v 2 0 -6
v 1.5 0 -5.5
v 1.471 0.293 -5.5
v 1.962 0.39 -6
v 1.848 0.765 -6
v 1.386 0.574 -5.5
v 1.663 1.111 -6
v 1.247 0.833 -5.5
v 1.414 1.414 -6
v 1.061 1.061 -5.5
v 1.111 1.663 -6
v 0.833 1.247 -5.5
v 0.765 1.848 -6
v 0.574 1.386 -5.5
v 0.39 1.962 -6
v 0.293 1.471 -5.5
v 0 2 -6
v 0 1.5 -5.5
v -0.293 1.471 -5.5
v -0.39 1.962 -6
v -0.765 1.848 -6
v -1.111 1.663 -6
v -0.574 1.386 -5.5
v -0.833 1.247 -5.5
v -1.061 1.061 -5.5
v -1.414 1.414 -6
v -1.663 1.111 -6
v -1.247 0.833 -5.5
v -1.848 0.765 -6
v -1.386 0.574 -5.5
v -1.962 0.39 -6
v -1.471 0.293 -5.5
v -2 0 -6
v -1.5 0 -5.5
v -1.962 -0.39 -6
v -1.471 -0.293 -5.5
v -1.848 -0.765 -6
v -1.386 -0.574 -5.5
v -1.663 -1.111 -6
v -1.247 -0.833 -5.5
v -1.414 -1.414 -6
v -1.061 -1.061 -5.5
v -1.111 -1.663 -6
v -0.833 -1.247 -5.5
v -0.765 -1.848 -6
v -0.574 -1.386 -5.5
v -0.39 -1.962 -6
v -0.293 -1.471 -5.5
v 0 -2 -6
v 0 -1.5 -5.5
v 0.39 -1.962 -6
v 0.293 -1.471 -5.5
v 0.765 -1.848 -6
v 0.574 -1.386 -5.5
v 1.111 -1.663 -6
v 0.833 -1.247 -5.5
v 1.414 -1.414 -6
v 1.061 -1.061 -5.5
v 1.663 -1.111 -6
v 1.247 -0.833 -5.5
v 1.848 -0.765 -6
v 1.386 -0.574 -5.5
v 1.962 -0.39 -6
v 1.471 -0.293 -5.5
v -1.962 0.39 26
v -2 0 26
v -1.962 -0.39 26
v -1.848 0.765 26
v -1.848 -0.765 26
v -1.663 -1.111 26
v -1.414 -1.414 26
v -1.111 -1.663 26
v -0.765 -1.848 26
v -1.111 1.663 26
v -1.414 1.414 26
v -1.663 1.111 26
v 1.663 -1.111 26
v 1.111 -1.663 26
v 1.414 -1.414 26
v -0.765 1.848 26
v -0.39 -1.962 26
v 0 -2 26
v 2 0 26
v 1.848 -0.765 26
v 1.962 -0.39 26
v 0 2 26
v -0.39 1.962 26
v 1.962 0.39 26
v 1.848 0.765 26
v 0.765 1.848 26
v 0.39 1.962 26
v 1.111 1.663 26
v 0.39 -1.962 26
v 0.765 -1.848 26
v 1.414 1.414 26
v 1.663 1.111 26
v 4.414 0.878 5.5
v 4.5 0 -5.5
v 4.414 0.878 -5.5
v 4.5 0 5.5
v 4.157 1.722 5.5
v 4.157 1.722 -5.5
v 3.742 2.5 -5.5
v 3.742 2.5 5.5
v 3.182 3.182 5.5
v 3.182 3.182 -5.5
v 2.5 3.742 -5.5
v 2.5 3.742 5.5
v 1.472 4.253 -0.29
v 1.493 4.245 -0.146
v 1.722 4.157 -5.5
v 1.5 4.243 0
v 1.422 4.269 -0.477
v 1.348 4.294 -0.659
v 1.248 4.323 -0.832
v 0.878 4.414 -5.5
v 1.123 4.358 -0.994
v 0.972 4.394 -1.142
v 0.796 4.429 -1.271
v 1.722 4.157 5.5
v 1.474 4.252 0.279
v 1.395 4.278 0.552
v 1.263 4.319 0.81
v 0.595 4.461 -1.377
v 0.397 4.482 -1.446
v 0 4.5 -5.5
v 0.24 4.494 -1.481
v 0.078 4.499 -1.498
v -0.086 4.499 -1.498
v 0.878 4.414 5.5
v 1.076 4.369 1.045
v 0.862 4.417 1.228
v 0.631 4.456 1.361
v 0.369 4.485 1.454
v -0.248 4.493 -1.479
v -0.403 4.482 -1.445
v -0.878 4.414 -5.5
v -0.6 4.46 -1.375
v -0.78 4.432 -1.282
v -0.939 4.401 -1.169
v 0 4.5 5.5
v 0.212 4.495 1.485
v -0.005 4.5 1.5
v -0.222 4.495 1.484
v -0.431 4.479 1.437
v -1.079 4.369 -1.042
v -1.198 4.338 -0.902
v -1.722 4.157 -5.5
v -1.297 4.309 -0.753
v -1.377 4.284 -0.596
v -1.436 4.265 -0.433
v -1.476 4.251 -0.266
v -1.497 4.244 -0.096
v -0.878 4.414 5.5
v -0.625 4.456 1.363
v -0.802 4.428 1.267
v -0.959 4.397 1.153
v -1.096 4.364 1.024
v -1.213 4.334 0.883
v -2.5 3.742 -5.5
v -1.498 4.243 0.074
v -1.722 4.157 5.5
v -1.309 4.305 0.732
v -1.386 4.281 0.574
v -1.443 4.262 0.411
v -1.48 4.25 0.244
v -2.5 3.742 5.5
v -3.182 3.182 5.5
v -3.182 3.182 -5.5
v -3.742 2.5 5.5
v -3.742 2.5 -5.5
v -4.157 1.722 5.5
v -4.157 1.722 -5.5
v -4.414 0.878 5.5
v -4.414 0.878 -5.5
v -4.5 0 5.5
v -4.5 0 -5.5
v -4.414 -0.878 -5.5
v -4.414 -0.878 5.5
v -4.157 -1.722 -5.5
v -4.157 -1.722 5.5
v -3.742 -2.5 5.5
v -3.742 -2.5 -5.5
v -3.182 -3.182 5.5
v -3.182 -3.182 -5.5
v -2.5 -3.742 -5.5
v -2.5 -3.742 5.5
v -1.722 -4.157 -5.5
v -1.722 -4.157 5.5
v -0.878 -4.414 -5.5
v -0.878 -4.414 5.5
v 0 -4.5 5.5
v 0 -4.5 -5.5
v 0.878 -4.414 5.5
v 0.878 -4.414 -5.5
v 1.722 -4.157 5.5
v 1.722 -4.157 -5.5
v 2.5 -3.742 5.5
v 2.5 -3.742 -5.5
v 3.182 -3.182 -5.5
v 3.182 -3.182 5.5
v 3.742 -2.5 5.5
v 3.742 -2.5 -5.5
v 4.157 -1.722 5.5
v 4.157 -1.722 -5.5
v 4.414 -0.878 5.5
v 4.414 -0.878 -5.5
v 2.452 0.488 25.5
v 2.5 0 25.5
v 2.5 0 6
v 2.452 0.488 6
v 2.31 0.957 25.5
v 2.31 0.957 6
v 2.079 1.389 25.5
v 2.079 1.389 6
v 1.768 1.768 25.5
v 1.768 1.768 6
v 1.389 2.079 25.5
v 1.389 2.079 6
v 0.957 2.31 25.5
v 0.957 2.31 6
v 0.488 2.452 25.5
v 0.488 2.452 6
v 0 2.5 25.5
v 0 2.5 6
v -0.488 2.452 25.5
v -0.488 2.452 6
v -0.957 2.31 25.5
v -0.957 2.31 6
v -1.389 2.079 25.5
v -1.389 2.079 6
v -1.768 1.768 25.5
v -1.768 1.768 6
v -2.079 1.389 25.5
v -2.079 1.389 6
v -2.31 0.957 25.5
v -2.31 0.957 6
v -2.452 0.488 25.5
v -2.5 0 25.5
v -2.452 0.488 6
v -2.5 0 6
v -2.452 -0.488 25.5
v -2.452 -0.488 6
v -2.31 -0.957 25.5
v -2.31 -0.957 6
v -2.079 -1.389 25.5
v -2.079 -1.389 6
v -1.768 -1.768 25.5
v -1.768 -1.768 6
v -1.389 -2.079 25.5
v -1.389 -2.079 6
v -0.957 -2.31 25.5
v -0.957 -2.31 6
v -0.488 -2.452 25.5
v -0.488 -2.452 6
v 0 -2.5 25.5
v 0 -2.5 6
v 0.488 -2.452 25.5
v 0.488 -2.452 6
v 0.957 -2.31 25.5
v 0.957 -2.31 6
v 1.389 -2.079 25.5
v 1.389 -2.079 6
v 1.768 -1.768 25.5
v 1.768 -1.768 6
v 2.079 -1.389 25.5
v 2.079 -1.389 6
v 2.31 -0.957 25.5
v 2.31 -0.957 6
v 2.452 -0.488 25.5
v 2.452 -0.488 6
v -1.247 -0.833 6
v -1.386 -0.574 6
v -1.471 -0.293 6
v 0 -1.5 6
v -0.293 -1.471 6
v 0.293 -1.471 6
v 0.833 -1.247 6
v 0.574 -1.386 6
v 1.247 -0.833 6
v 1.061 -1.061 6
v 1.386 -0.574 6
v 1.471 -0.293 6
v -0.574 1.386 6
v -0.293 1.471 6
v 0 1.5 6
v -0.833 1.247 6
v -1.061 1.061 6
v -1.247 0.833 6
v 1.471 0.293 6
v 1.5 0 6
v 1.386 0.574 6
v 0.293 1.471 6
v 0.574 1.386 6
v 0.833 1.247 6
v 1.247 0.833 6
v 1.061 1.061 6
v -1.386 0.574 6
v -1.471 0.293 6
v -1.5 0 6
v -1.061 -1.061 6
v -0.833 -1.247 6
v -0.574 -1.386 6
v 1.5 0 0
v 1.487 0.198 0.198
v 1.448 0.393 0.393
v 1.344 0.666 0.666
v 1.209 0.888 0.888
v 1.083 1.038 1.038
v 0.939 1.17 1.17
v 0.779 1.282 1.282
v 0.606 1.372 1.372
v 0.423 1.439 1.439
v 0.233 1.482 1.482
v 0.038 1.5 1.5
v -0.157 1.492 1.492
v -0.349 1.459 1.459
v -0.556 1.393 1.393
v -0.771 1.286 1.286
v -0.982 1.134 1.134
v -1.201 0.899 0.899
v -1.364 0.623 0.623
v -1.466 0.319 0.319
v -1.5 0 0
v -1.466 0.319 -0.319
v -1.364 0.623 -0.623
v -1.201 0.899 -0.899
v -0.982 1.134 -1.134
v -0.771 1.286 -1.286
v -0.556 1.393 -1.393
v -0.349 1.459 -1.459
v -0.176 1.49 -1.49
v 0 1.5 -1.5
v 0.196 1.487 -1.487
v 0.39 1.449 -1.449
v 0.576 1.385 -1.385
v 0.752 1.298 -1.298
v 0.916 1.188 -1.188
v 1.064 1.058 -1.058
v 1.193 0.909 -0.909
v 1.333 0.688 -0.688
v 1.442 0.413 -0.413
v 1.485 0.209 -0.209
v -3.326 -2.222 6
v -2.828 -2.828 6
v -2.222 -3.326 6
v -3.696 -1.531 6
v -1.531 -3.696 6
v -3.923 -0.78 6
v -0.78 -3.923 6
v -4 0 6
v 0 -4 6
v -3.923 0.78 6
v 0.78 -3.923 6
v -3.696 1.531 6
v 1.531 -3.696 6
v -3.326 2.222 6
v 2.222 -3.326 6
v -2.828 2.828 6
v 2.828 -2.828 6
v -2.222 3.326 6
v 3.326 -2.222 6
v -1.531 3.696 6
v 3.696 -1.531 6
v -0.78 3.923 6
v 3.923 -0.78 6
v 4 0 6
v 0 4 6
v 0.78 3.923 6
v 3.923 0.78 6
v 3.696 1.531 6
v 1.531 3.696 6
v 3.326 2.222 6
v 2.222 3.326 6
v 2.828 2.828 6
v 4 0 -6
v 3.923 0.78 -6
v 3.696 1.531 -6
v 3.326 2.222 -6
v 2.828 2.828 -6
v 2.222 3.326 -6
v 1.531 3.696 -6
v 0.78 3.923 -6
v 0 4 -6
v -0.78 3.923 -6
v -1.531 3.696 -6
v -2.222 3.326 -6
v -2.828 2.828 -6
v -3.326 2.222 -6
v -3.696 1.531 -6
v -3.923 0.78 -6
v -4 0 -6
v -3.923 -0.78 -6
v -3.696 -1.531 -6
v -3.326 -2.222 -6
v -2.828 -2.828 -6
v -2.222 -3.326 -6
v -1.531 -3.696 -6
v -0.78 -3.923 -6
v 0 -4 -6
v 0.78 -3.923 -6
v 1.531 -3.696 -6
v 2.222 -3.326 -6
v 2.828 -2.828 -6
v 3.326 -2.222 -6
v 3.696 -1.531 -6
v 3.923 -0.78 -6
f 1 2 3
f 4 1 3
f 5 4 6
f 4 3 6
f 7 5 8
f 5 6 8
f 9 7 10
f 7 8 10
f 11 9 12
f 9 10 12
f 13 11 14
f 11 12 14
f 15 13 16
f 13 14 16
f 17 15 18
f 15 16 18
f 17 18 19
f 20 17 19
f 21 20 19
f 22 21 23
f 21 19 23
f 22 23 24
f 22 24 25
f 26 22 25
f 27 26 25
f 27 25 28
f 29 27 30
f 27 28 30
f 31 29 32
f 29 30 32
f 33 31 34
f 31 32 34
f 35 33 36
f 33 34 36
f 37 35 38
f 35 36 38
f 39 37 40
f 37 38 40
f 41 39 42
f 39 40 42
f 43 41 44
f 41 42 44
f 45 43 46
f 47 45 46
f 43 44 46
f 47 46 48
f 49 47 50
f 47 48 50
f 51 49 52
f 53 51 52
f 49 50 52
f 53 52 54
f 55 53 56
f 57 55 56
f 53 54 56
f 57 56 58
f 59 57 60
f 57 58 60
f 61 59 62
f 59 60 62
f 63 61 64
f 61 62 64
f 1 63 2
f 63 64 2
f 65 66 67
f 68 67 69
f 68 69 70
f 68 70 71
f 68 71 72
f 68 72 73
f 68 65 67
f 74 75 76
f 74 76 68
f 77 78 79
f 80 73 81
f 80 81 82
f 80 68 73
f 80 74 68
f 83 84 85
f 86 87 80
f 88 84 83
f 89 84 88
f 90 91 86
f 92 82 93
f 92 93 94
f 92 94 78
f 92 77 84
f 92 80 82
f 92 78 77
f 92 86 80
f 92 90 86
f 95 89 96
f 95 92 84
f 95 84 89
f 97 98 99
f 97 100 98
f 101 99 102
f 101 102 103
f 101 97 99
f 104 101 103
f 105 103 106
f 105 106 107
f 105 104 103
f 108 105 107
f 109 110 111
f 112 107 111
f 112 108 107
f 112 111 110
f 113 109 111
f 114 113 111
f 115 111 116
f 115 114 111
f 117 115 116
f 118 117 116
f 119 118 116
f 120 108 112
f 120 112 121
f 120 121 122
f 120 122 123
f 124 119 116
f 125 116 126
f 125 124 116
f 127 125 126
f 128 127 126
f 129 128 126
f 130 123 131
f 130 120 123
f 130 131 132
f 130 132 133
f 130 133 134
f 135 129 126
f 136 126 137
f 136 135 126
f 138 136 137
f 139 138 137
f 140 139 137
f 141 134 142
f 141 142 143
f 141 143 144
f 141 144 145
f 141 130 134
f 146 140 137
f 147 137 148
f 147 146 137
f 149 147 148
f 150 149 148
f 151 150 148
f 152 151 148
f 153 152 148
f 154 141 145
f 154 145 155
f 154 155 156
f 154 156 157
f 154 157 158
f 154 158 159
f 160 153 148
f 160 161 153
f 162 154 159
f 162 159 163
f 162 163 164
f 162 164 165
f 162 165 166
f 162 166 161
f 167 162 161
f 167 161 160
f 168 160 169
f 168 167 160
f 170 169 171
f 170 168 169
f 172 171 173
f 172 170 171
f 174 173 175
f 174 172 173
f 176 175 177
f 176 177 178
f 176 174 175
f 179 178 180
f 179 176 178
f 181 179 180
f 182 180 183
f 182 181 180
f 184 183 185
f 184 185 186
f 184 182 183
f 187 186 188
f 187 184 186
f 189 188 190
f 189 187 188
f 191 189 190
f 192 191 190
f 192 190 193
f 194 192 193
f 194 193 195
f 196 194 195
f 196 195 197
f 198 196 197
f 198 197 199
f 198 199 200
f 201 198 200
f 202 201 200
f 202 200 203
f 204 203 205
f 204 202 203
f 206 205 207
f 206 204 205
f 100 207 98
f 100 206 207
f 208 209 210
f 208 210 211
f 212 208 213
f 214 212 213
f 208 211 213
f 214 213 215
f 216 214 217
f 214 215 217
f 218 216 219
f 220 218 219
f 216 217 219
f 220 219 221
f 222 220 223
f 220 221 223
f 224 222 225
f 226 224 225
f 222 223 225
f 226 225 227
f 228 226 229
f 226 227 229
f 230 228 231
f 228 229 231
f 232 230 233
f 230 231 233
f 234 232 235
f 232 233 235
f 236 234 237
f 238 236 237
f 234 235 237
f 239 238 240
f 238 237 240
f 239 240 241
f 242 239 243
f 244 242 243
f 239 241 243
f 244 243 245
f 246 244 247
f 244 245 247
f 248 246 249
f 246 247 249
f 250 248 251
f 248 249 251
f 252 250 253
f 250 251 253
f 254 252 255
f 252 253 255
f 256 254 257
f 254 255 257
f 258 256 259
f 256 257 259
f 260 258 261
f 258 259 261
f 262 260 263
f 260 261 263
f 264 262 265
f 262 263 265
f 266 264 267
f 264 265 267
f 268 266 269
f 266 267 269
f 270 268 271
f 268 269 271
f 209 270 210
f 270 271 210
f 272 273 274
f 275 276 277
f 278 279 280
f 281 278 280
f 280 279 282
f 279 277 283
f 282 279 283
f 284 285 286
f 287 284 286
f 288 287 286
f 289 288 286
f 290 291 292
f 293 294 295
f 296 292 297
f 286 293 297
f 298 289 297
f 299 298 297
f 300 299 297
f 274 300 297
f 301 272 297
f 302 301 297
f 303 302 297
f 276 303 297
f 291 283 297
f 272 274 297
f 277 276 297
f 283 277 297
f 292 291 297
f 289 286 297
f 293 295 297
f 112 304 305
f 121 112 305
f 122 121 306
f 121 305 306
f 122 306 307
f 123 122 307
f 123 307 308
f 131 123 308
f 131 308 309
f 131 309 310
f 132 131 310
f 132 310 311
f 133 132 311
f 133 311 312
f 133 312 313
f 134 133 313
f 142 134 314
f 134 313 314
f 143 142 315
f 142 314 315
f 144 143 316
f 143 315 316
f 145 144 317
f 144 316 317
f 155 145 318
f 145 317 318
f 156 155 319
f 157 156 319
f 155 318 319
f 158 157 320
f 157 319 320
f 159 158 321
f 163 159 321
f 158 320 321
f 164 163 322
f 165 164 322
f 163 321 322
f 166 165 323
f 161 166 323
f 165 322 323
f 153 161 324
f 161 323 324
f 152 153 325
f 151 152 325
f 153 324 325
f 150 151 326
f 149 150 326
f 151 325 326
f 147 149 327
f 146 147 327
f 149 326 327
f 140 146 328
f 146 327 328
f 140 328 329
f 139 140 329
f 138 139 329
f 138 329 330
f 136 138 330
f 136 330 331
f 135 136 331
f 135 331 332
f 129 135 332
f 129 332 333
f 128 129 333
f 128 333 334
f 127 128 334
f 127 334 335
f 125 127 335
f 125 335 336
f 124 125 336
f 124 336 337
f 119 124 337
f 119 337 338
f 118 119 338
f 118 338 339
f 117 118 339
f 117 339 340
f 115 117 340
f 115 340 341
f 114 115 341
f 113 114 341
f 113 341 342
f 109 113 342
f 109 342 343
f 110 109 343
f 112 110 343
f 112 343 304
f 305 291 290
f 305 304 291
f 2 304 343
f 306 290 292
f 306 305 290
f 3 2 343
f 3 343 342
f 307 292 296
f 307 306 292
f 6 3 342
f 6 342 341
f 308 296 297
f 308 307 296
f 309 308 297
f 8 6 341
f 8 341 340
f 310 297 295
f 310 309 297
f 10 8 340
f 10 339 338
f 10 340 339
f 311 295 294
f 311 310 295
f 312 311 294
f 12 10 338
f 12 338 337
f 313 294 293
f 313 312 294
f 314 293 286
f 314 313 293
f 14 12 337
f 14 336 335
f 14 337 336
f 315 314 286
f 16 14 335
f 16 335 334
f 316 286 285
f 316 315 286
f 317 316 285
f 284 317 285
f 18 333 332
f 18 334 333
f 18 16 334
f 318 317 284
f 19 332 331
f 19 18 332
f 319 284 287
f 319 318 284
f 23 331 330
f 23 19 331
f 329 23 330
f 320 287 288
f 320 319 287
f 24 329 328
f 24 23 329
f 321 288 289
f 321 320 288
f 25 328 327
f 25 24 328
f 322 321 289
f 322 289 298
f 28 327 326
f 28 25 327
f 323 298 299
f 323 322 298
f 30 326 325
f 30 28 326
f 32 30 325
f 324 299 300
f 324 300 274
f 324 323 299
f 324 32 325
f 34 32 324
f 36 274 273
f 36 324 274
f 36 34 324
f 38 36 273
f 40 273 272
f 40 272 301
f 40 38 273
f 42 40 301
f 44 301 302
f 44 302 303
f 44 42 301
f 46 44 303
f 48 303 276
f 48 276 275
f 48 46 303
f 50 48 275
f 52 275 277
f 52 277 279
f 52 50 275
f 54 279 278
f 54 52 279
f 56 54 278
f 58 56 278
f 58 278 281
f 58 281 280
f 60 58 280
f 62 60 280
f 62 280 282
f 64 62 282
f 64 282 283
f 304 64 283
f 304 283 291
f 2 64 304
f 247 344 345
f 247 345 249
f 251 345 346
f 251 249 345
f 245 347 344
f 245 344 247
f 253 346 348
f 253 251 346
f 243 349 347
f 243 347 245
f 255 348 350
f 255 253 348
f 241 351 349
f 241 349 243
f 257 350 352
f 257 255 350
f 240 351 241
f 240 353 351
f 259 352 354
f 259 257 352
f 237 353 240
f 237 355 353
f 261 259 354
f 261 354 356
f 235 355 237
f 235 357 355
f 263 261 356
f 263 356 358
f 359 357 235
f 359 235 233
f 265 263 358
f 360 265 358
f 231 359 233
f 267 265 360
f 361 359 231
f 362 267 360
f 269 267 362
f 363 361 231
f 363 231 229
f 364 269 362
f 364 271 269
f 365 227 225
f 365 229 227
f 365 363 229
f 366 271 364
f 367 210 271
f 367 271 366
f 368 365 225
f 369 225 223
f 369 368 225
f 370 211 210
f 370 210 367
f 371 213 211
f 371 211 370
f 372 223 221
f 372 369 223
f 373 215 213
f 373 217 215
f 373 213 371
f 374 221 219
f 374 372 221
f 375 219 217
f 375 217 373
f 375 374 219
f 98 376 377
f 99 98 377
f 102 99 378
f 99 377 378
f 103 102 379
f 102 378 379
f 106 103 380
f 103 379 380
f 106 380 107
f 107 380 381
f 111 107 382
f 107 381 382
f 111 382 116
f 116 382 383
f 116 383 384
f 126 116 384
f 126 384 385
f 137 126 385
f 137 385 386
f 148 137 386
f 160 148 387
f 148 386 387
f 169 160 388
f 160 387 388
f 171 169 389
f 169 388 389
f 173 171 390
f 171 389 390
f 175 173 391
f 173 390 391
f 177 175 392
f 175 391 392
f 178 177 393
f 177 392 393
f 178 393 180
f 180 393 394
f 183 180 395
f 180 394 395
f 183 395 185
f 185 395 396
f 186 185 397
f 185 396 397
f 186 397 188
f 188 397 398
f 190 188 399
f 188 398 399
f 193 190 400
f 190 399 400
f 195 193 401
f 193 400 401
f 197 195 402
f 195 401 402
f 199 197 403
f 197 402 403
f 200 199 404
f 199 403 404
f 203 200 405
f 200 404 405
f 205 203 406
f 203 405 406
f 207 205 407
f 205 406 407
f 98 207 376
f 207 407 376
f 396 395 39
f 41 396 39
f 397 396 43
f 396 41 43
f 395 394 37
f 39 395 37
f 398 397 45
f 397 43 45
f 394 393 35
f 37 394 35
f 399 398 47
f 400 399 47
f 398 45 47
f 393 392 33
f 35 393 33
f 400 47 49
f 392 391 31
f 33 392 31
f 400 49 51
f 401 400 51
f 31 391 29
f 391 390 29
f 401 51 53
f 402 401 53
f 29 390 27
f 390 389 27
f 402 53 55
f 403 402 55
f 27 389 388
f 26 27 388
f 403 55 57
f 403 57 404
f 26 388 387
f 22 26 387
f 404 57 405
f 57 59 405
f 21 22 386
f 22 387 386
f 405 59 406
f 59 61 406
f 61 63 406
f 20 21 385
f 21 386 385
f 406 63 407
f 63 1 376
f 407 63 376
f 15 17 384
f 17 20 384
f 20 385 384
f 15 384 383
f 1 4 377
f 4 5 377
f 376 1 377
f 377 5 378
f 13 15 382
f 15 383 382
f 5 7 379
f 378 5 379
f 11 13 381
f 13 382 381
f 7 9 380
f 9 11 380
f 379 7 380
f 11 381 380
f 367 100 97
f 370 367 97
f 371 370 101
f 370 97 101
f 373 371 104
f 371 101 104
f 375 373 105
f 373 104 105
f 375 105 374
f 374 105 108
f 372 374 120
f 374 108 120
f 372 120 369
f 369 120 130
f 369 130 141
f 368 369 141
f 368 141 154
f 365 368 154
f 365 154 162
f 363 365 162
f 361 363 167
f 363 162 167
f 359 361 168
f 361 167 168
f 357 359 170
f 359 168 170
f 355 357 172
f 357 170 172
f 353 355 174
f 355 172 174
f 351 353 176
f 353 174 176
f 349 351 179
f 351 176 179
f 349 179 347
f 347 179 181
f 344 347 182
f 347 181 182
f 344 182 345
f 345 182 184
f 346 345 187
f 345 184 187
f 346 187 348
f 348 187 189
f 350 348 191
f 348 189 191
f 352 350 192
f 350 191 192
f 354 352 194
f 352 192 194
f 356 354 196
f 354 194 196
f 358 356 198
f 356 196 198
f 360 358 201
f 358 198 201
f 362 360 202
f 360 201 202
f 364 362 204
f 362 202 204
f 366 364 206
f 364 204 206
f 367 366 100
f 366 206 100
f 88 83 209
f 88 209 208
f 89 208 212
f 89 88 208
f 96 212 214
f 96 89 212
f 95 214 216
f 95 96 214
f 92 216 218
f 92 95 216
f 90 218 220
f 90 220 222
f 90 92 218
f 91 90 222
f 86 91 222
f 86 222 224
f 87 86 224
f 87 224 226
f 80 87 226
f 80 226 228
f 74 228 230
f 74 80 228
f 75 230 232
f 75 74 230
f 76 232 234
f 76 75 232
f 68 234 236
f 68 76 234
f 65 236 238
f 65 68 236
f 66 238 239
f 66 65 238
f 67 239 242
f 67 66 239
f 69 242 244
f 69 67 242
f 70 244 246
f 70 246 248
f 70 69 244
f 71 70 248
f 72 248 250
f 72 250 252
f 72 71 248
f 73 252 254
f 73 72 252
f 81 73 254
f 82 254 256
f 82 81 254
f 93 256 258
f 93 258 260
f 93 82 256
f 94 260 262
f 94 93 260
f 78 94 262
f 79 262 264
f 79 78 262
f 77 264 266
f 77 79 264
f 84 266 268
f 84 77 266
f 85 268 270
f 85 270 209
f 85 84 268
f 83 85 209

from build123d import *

# Parameters (mm, degrees)
F0_R     = 4.5
F0_R_2   = 1.5
F1_DEPTH = 6
F2_R     = 2.5
F3_DEPTH = 20
F4_SIZE  = 0.5
F5_R     = 1.5
F6_DEPTH = 4.501


with BuildPart() as f1:
    # F0 (on Top) → F1 (new body, symmetric)
    with BuildSketch(Plane.XY):
        Circle(F0_R)
        Circle(F0_R_2, mode=Mode.SUBTRACT)
    extrude(amount=F1_DEPTH, both=True)

    # F2 (on face) → F3 (join)
    with BuildSketch(Plane.XY.offset(6)):
        Circle(F2_R)
    extrude(amount=F3_DEPTH)

    # F4
    f4_edges = [f1.edges().sort_by_distance(p)[0] for p in [
        (-2.5, 0, 26),
        (-4.5, 0, 6),
        (-1.5, 0, -6),
        (-4.5, 0, -6),
    ]]
    chamfer(f4_edges, length=F4_SIZE)

    # F5 (on Front) → F6 (cut, through all)
    with BuildSketch(Plane.XZ):
        Circle(F5_R)
    extrude(amount=-F6_DEPTH, mode=Mode.SUBTRACT)


solid = f1.part
